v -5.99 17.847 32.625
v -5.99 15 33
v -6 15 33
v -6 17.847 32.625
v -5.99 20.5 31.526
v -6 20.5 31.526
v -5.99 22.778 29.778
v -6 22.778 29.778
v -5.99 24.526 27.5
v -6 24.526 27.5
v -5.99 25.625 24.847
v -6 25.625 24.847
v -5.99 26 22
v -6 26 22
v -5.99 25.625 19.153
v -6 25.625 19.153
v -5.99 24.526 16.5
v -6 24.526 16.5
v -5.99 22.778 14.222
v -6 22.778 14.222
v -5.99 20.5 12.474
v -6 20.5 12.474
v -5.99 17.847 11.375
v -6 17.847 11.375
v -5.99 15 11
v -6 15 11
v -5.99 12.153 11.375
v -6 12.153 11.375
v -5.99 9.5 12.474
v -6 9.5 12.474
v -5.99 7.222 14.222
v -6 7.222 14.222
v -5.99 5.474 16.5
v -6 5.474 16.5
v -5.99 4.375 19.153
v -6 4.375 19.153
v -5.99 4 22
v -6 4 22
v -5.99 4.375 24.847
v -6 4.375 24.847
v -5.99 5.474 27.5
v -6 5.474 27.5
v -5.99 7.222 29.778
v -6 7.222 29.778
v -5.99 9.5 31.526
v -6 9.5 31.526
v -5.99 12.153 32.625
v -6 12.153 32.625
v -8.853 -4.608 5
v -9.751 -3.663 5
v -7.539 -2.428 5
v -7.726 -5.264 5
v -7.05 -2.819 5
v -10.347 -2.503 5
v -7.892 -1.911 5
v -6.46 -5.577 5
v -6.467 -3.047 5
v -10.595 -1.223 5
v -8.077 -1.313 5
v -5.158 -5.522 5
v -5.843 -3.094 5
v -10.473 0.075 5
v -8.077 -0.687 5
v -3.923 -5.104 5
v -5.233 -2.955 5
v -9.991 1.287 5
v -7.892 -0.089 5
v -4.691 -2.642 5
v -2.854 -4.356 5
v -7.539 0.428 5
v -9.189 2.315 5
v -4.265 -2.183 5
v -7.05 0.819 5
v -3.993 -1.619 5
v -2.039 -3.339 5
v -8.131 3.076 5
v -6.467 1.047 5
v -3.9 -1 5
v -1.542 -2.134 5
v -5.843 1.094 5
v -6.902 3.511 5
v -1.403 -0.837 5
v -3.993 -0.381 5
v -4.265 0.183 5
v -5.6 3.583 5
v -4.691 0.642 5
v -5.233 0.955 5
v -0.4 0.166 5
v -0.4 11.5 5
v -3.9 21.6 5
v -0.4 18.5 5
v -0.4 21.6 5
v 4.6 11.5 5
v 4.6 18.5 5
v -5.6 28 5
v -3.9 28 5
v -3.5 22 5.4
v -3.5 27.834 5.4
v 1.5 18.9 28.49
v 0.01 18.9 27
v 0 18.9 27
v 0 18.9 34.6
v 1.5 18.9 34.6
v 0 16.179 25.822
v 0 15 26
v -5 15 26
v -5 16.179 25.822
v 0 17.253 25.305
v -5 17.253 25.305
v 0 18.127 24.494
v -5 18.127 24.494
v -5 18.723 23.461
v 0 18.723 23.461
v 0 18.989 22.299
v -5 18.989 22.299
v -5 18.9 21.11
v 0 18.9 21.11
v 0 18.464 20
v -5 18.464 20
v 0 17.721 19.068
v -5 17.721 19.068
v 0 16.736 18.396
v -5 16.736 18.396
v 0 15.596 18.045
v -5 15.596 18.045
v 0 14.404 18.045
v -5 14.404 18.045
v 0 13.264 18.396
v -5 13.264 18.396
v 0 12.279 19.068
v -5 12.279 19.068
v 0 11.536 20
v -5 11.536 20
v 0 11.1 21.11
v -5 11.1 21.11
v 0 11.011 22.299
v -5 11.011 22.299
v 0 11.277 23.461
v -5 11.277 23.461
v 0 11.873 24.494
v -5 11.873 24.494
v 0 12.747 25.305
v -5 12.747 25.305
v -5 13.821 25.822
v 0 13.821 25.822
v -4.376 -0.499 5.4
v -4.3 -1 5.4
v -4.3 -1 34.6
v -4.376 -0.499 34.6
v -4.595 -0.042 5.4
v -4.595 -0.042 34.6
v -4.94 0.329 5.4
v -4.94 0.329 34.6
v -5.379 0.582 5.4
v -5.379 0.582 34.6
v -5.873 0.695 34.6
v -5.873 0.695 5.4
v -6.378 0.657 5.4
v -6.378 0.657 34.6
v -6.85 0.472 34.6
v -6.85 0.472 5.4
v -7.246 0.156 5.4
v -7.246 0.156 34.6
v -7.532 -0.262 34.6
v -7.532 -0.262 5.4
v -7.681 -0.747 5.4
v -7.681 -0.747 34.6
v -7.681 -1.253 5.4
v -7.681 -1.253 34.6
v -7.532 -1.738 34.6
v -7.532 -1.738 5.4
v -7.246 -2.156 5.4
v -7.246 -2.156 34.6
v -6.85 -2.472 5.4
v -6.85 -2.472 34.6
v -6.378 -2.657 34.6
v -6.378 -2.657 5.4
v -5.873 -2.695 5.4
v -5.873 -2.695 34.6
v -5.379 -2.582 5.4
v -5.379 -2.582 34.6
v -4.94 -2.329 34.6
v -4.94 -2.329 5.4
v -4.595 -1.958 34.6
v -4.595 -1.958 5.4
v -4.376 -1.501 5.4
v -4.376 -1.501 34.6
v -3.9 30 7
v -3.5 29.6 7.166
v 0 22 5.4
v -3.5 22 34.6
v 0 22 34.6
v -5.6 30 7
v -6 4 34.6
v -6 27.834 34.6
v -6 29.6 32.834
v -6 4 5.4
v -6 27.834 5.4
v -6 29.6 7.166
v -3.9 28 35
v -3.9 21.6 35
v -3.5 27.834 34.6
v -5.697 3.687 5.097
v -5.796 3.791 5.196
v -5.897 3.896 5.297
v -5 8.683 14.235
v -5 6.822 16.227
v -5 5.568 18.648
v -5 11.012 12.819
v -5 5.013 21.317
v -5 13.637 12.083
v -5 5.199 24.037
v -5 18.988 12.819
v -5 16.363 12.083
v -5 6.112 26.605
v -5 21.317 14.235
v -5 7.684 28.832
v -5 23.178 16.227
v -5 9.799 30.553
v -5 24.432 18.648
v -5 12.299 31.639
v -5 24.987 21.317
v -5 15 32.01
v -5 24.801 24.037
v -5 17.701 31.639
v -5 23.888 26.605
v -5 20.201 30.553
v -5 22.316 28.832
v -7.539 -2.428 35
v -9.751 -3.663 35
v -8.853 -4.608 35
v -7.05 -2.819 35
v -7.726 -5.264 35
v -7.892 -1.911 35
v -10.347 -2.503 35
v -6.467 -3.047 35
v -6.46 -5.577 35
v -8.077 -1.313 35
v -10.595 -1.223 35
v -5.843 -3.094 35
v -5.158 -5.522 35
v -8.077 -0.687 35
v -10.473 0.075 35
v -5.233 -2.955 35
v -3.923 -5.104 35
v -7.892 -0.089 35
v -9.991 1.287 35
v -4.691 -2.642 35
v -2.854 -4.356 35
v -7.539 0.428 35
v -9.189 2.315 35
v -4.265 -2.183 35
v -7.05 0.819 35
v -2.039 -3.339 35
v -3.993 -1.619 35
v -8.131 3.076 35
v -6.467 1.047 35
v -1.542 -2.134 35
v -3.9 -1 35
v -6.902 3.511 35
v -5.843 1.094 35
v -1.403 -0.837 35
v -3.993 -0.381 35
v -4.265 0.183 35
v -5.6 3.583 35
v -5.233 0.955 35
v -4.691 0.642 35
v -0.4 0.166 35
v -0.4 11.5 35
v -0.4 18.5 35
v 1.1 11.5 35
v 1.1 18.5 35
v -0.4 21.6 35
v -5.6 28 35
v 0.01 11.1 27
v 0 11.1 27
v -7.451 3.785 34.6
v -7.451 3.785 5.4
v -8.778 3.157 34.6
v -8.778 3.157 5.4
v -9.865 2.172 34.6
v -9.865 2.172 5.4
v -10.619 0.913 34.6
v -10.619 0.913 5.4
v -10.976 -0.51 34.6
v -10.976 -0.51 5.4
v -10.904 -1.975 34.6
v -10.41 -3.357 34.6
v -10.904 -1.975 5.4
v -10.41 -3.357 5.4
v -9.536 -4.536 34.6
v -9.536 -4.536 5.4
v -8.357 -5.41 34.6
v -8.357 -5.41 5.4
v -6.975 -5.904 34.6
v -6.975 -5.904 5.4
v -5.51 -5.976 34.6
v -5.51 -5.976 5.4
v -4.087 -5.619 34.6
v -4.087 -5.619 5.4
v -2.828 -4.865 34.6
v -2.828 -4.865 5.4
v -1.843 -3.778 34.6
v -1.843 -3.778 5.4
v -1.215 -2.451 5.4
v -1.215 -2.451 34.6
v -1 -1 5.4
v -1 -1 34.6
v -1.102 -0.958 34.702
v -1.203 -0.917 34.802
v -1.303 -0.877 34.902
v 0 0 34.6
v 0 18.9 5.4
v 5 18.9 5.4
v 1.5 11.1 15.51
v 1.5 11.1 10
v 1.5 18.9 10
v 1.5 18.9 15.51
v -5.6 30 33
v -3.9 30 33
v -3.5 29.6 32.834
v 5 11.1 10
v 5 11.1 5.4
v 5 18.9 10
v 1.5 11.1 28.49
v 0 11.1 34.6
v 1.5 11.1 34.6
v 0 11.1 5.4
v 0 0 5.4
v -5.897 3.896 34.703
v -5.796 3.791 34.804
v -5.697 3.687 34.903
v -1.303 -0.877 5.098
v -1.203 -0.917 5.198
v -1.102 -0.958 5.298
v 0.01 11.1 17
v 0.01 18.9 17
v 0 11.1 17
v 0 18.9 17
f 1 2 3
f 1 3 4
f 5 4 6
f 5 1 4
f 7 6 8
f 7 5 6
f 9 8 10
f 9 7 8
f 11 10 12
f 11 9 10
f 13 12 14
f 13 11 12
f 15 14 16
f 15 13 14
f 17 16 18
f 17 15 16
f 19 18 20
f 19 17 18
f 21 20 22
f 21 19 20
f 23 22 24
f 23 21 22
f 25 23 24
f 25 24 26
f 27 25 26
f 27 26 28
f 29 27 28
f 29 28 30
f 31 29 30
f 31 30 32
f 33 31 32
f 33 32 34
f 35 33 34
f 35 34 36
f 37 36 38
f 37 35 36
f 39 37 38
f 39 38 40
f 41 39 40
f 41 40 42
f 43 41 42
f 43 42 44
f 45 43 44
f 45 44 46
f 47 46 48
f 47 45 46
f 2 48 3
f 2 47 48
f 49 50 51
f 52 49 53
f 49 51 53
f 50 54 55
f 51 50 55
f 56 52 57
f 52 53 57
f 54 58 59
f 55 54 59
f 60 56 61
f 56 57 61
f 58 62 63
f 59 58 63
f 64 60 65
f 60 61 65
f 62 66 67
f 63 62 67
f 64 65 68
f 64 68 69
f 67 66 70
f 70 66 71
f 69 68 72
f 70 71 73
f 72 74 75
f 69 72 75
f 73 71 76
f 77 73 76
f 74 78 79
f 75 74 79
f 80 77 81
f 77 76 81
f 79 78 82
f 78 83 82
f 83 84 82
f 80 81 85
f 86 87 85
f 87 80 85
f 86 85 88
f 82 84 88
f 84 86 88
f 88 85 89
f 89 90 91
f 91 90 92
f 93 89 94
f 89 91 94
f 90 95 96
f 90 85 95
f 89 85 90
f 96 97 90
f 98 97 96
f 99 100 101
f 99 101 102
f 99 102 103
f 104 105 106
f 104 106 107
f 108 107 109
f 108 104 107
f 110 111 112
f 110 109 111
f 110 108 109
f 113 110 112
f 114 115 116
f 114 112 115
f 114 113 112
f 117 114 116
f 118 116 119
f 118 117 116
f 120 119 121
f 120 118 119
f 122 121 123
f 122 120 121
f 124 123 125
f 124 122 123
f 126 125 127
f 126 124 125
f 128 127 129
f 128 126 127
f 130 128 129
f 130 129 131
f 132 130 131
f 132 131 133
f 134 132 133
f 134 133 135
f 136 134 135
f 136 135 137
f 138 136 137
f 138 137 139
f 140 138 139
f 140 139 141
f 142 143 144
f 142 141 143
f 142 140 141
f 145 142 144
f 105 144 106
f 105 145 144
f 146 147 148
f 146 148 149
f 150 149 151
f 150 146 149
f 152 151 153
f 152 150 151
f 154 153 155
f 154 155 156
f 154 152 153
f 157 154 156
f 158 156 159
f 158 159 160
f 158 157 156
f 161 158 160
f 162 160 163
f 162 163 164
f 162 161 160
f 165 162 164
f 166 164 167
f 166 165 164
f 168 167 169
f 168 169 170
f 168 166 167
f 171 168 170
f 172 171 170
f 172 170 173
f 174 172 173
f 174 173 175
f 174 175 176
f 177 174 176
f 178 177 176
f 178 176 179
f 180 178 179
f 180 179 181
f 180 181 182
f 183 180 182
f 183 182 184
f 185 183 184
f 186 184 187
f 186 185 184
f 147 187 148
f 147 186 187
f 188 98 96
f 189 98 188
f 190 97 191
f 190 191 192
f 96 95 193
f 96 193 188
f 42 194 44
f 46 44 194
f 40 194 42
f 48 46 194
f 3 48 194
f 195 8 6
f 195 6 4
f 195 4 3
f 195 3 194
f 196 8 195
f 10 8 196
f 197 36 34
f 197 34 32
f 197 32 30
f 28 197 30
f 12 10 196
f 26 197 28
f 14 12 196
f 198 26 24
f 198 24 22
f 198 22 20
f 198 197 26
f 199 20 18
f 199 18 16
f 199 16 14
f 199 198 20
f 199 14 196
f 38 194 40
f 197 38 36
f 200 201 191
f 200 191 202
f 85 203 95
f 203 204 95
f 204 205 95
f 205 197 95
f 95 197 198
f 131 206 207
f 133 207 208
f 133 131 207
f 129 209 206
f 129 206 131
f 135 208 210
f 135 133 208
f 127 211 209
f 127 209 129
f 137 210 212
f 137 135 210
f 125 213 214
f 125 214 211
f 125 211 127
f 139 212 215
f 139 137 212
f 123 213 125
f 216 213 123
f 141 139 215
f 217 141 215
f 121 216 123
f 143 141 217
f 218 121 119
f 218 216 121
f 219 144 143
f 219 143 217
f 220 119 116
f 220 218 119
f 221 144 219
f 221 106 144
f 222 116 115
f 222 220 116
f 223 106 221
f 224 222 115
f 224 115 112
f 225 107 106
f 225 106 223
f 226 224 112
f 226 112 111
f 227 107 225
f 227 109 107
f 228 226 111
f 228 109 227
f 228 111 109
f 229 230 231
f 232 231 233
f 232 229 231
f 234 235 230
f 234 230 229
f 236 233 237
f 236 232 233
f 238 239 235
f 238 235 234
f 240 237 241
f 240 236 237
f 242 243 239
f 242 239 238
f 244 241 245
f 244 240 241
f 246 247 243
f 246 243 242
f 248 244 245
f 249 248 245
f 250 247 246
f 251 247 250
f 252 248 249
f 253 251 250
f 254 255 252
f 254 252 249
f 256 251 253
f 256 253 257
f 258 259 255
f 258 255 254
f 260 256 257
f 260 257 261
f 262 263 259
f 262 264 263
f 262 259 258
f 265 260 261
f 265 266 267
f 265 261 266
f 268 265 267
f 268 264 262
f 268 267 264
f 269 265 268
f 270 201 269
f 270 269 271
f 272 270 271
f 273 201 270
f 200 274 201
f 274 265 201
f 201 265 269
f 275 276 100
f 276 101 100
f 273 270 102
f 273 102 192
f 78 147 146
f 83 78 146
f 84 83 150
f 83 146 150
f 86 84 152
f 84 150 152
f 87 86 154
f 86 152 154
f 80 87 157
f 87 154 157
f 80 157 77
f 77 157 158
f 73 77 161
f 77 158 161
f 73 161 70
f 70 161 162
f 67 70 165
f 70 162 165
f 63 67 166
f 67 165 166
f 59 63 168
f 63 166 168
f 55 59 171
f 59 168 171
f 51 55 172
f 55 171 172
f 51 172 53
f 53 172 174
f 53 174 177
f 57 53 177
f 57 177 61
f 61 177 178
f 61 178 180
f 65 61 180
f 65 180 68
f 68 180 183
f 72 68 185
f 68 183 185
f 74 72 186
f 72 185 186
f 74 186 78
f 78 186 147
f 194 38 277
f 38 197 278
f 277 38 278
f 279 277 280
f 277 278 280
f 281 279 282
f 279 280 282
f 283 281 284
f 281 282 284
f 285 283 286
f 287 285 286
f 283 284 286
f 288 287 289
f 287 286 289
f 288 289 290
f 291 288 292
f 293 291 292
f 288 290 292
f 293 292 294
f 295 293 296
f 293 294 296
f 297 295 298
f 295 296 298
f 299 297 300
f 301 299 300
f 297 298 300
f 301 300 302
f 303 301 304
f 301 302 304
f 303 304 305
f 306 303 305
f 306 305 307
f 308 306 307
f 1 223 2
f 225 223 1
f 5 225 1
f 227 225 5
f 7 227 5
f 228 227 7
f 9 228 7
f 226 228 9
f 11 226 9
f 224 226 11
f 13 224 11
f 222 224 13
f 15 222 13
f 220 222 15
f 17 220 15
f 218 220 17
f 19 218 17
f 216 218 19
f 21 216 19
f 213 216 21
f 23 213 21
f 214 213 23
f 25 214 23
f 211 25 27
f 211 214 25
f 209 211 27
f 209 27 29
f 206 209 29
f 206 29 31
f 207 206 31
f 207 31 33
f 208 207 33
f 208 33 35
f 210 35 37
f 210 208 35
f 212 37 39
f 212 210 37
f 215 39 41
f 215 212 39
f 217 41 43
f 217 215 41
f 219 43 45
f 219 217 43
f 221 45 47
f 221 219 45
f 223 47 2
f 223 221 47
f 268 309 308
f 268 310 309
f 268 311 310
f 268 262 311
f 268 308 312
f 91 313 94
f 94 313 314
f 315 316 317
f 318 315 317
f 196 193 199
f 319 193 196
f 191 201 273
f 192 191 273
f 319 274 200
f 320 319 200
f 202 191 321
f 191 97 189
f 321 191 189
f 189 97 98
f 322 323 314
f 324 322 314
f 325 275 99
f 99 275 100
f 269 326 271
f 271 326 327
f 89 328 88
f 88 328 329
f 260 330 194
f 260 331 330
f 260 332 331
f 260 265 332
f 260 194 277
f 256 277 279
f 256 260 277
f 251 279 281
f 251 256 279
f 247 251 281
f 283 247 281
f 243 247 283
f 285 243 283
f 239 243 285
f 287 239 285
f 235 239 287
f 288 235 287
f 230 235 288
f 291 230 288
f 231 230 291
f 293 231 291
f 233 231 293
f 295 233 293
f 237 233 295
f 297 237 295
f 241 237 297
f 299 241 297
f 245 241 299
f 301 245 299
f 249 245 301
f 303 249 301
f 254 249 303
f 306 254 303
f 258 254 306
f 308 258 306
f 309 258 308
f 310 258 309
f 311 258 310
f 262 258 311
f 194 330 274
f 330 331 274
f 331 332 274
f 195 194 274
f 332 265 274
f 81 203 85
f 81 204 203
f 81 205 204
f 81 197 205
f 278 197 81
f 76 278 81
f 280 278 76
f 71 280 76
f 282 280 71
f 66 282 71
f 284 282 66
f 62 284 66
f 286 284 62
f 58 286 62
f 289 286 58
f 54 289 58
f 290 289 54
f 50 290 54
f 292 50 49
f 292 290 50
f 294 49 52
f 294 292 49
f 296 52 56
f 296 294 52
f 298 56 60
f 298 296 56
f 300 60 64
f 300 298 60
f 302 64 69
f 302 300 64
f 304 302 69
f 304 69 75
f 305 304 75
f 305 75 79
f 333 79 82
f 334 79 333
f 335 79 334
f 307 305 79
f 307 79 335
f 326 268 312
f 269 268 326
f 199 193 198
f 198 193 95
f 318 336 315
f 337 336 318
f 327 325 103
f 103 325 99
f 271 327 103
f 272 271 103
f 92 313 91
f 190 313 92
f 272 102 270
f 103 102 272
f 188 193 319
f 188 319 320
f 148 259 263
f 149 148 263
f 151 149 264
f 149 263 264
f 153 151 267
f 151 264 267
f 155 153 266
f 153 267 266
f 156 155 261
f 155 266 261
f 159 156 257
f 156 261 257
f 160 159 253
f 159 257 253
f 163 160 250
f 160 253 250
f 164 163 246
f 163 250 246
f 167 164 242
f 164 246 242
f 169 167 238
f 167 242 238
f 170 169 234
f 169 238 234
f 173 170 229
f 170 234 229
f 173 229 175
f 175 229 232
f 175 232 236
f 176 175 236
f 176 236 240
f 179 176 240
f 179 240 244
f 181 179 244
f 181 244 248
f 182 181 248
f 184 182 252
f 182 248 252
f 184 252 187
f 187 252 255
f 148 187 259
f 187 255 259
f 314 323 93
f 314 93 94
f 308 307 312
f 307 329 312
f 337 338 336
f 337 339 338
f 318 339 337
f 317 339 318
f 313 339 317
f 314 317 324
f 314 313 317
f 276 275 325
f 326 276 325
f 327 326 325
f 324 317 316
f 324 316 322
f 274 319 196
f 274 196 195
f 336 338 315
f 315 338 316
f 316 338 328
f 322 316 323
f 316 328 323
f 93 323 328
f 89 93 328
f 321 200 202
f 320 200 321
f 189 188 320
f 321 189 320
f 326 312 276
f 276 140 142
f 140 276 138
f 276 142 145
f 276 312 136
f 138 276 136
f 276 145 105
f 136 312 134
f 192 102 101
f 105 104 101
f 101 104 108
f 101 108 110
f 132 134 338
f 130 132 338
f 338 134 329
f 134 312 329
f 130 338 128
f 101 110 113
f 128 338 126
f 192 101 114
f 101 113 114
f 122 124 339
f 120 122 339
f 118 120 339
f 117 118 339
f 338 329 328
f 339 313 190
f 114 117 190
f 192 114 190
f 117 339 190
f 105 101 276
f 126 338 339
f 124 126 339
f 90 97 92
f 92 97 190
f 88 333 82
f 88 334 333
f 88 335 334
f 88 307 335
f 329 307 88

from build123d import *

# Parameters (mm, degrees)
BOX032_W              = 10
BOX032_H              = 10
BOX032_DEPTH          = 30
CYLINDER003_R         = 1.7
CYLINDER003_DEPTH     = 30
BOX022_W              = 1.5
BOX022_H              = 7.8
BOX022_DEPTH          = 8
CHAMFER006006003_SIZE = 1.49
BOX020_W              = 1.5
BOX020_H              = 7.8
BOX020_DEPTH          = 12
CHAMFER_SIZE          = 1.49
BOX021_W              = 5
BOX021_H              = 7.8
BOX021_DEPTH          = 5
BOX_W                 = 2
BOX_H                 = 2
BOX_DEPTH             = 30
CHAMFER006006002_SIZE = 1
CYLINDER002_R         = 5
CYLINDER002_DEPTH     = 30
CYLINDER001_R         = 11
CYLINDER001_DEPTH     = 10
CYLINDER_R            = 4
CYLINDER_DEPTH        = 10
BOX019_W              = 6
BOX019_H              = 30
BOX019_DEPTH          = 30
CHAMFER006006004_SIZE = 2
CHAMFER006006005_SIZE = 0.99
CHAMFER006006019_SIZE = 0.4


with BuildPart() as cube031:
    # Box032 → Box032 (new body)
    with BuildSketch(Plane(origin=(-3.5, 22, 0), x_dir=(1, 0, 0), z_dir=(0, 0, 1))):
        with Locations((5, 5)):
            Rectangle(BOX032_W, BOX032_H)
    extrude(amount=BOX032_DEPTH)


with BuildPart() as cylinder003:
    # Cylinder003 → Cylinder003 (new body)
    with BuildSketch(Plane(origin=(-6, -1, 0), x_dir=(1, 0, 0), z_dir=(0, 0, 1))):
        Circle(CYLINDER003_R)
    extrude(amount=CYLINDER003_DEPTH)


with BuildPart() as chamfer006006003:
    # Box022 → Box022 (new body)
    with BuildSketch(Plane(origin=(0, 11.1, 22), x_dir=(1, 0, 0), z_dir=(0, 0, 1))):
        with Locations((0.75, 3.9)):
            Rectangle(BOX022_W, BOX022_H)
    extrude(amount=BOX022_DEPTH)

    # Chamfer006006003
    chamfer006006003_edges = [chamfer006006003.edges().sort_by_distance(p)[0] for p in [
        (1.5, 15, 22),
    ]]
    chamfer(chamfer006006003_edges, length=CHAMFER006006003_SIZE)


with BuildPart() as chamfer_body:
    # Box020 → Box020 (new body)
    with BuildSketch(Plane(origin=(0, 11.1, 0), x_dir=(1, 0, 0), z_dir=(0, 0, 1))):
        with Locations((0.75, 3.9)):
            Rectangle(BOX020_W, BOX020_H)
    extrude(amount=BOX020_DEPTH)

    # Chamfer
    chamfer_edges = [chamfer_body.edges().sort_by_distance(p)[0] for p in [
        (1.5, 15, 12),
    ]]
    chamfer(chamfer_edges, length=CHAMFER_SIZE)


with BuildPart() as cube020:
    # Box021 → Box021 (new body)
    with BuildSketch(Plane(origin=(0, 11.1, 0), x_dir=(1, 0, 0), z_dir=(0, 0, 1))):
        with Locations((2.5, 3.9)):
            Rectangle(BOX021_W, BOX021_H)
    extrude(amount=BOX021_DEPTH)


with BuildPart() as chamfer006006002:
    # Box → Box (new body)
    with BuildSketch(Plane(origin=(-2, -1, 0), x_dir=(1, 0, 0), z_dir=(0, 0, 1))):
        with Locations((1, 1)):
            Rectangle(BOX_W, BOX_H)
    extrude(amount=BOX_DEPTH)

    # Chamfer006006002
    chamfer006006002_edges = [chamfer006006002.edges().sort_by_distance(p)[0] for p in [
        (0, -1, 15),
    ]]
    chamfer(chamfer006006002_edges, length=CHAMFER006006002_SIZE)


with BuildPart() as cylinder002:
    # Cylinder002 → Cylinder002 (new body)
    with BuildSketch(Plane(origin=(-6, -1, 0), x_dir=(1, 0, 0), z_dir=(0, 0, 1))):
        Circle(CYLINDER002_R)
    extrude(amount=CYLINDER002_DEPTH)


with BuildPart() as cylinder001:
    # Cylinder001 → Cylinder001 (new body)
    with BuildSketch(Plane(origin=(-5, 15, 17), x_dir=(0, 0, 1), z_dir=(-1, 0, 0))):
        Circle(CYLINDER001_R)
    extrude(amount=CYLINDER001_DEPTH)


with BuildPart() as cylinder:
    # Cylinder → Cylinder (new body)
    with BuildSketch(Plane(origin=(3, 15, 17), x_dir=(0, 0, 1), z_dir=(-1, 0, 0))):
        Circle(CYLINDER_R)
    extrude(amount=CYLINDER_DEPTH)


with BuildPart() as chamfer006006019:
    # Box019 → Box019 (new body)
    with BuildSketch(Plane(origin=(-6, 0, 0), x_dir=(1, 0, 0), z_dir=(0, 0, 1))):
        with Locations((3, 15)):
            Rectangle(BOX019_W, BOX019_H)
    extrude(amount=BOX019_DEPTH)

    # Chamfer006006004
    chamfer006006004_edges = [chamfer006006019.edges().sort_by_distance(p)[0] for p in [
        (-3, 30, 0),
        (-3, 30, 30),
    ]]
    chamfer(chamfer006006004_edges, length=CHAMFER006006004_SIZE)

    # Cut: cut Cylinder
    add(cylinder.part, mode=Mode.SUBTRACT)

    # Cut001: cut Cylinder001
    add(cylinder001.part, mode=Mode.SUBTRACT)

    # Chamfer006006005
    chamfer006006005_edges = [chamfer006006019.edges().sort_by_distance(p)[0] for p in [
        (-5, 15, 6),
    ]]
    chamfer(chamfer006006005_edges, length=CHAMFER006006005_SIZE)

    # Fusion: union Chamfer006006003, Chamfer body, Cube020, Chamfer006006002, Cylinder002
    add(chamfer006006003.part)
    add(chamfer_body.part)
    add(cube020.part)
    add(chamfer006006002.part)
    add(cylinder002.part)

    # Cut002: cut Cylinder003
    add(cylinder003.part, mode=Mode.SUBTRACT)

    # Cut002004005003: cut Cube031
    add(cube031.part, mode=Mode.SUBTRACT)

    # Chamfer006006019
    chamfer006006019_edges = [chamfer006006019.edges().sort_by_distance(p)[0] for p in [
        (-0.5, -0.5, 0),
        (-0.5, -0.5, 30),
        (0, 20.45, 0),
        (-1.75, 22, 0),
        (-3.5, 25, 0),
        (-6, 16, 0),
        (-9.535534, -4.535534, 0),
        (0, 5.55, 0),
        (2.5, 11.1, 0),
        (5, 15, 0),
        (2.5, 18.9, 0),
        (-7.202082, -2.202082, 0),
        (-5.228638, 0.514926, 0),
        (-4.38335, -0.474221, 0),
        (0, 5.55, 30),
        (0, 20.45, 30),
        (-6, 16, 30),
        (-3.5, 25, 30),
        (-1.75, 22, 30),
        (0.75, 18.9, 30),
        (1.5, 15, 30),
        (0.75, 11.1, 30),
        (-9.535534, -4.535534, 30),
        (-7.202082, -2.202082, 30),
        (-5.228638, 0.514926, 30),
        (-4.38335, -0.474221, 30),
        (-3.5, 29, 29),
        (-3.5, 30, 15),
        (-3.5, 29, 1),
        (-6, 29, 1),
        (-6, 29, 29),
        (-6, 30, 15),
    ]]
    chamfer(chamfer006006019_edges, length=CHAMFER006006019_SIZE)


with BuildPart() as chamfer006006019_1:
    # Chamfer006006019 placement: moved
    add(chamfer006006019.part.moved(Location((0, 0, 5))))


solid = chamfer006006019_1.part
